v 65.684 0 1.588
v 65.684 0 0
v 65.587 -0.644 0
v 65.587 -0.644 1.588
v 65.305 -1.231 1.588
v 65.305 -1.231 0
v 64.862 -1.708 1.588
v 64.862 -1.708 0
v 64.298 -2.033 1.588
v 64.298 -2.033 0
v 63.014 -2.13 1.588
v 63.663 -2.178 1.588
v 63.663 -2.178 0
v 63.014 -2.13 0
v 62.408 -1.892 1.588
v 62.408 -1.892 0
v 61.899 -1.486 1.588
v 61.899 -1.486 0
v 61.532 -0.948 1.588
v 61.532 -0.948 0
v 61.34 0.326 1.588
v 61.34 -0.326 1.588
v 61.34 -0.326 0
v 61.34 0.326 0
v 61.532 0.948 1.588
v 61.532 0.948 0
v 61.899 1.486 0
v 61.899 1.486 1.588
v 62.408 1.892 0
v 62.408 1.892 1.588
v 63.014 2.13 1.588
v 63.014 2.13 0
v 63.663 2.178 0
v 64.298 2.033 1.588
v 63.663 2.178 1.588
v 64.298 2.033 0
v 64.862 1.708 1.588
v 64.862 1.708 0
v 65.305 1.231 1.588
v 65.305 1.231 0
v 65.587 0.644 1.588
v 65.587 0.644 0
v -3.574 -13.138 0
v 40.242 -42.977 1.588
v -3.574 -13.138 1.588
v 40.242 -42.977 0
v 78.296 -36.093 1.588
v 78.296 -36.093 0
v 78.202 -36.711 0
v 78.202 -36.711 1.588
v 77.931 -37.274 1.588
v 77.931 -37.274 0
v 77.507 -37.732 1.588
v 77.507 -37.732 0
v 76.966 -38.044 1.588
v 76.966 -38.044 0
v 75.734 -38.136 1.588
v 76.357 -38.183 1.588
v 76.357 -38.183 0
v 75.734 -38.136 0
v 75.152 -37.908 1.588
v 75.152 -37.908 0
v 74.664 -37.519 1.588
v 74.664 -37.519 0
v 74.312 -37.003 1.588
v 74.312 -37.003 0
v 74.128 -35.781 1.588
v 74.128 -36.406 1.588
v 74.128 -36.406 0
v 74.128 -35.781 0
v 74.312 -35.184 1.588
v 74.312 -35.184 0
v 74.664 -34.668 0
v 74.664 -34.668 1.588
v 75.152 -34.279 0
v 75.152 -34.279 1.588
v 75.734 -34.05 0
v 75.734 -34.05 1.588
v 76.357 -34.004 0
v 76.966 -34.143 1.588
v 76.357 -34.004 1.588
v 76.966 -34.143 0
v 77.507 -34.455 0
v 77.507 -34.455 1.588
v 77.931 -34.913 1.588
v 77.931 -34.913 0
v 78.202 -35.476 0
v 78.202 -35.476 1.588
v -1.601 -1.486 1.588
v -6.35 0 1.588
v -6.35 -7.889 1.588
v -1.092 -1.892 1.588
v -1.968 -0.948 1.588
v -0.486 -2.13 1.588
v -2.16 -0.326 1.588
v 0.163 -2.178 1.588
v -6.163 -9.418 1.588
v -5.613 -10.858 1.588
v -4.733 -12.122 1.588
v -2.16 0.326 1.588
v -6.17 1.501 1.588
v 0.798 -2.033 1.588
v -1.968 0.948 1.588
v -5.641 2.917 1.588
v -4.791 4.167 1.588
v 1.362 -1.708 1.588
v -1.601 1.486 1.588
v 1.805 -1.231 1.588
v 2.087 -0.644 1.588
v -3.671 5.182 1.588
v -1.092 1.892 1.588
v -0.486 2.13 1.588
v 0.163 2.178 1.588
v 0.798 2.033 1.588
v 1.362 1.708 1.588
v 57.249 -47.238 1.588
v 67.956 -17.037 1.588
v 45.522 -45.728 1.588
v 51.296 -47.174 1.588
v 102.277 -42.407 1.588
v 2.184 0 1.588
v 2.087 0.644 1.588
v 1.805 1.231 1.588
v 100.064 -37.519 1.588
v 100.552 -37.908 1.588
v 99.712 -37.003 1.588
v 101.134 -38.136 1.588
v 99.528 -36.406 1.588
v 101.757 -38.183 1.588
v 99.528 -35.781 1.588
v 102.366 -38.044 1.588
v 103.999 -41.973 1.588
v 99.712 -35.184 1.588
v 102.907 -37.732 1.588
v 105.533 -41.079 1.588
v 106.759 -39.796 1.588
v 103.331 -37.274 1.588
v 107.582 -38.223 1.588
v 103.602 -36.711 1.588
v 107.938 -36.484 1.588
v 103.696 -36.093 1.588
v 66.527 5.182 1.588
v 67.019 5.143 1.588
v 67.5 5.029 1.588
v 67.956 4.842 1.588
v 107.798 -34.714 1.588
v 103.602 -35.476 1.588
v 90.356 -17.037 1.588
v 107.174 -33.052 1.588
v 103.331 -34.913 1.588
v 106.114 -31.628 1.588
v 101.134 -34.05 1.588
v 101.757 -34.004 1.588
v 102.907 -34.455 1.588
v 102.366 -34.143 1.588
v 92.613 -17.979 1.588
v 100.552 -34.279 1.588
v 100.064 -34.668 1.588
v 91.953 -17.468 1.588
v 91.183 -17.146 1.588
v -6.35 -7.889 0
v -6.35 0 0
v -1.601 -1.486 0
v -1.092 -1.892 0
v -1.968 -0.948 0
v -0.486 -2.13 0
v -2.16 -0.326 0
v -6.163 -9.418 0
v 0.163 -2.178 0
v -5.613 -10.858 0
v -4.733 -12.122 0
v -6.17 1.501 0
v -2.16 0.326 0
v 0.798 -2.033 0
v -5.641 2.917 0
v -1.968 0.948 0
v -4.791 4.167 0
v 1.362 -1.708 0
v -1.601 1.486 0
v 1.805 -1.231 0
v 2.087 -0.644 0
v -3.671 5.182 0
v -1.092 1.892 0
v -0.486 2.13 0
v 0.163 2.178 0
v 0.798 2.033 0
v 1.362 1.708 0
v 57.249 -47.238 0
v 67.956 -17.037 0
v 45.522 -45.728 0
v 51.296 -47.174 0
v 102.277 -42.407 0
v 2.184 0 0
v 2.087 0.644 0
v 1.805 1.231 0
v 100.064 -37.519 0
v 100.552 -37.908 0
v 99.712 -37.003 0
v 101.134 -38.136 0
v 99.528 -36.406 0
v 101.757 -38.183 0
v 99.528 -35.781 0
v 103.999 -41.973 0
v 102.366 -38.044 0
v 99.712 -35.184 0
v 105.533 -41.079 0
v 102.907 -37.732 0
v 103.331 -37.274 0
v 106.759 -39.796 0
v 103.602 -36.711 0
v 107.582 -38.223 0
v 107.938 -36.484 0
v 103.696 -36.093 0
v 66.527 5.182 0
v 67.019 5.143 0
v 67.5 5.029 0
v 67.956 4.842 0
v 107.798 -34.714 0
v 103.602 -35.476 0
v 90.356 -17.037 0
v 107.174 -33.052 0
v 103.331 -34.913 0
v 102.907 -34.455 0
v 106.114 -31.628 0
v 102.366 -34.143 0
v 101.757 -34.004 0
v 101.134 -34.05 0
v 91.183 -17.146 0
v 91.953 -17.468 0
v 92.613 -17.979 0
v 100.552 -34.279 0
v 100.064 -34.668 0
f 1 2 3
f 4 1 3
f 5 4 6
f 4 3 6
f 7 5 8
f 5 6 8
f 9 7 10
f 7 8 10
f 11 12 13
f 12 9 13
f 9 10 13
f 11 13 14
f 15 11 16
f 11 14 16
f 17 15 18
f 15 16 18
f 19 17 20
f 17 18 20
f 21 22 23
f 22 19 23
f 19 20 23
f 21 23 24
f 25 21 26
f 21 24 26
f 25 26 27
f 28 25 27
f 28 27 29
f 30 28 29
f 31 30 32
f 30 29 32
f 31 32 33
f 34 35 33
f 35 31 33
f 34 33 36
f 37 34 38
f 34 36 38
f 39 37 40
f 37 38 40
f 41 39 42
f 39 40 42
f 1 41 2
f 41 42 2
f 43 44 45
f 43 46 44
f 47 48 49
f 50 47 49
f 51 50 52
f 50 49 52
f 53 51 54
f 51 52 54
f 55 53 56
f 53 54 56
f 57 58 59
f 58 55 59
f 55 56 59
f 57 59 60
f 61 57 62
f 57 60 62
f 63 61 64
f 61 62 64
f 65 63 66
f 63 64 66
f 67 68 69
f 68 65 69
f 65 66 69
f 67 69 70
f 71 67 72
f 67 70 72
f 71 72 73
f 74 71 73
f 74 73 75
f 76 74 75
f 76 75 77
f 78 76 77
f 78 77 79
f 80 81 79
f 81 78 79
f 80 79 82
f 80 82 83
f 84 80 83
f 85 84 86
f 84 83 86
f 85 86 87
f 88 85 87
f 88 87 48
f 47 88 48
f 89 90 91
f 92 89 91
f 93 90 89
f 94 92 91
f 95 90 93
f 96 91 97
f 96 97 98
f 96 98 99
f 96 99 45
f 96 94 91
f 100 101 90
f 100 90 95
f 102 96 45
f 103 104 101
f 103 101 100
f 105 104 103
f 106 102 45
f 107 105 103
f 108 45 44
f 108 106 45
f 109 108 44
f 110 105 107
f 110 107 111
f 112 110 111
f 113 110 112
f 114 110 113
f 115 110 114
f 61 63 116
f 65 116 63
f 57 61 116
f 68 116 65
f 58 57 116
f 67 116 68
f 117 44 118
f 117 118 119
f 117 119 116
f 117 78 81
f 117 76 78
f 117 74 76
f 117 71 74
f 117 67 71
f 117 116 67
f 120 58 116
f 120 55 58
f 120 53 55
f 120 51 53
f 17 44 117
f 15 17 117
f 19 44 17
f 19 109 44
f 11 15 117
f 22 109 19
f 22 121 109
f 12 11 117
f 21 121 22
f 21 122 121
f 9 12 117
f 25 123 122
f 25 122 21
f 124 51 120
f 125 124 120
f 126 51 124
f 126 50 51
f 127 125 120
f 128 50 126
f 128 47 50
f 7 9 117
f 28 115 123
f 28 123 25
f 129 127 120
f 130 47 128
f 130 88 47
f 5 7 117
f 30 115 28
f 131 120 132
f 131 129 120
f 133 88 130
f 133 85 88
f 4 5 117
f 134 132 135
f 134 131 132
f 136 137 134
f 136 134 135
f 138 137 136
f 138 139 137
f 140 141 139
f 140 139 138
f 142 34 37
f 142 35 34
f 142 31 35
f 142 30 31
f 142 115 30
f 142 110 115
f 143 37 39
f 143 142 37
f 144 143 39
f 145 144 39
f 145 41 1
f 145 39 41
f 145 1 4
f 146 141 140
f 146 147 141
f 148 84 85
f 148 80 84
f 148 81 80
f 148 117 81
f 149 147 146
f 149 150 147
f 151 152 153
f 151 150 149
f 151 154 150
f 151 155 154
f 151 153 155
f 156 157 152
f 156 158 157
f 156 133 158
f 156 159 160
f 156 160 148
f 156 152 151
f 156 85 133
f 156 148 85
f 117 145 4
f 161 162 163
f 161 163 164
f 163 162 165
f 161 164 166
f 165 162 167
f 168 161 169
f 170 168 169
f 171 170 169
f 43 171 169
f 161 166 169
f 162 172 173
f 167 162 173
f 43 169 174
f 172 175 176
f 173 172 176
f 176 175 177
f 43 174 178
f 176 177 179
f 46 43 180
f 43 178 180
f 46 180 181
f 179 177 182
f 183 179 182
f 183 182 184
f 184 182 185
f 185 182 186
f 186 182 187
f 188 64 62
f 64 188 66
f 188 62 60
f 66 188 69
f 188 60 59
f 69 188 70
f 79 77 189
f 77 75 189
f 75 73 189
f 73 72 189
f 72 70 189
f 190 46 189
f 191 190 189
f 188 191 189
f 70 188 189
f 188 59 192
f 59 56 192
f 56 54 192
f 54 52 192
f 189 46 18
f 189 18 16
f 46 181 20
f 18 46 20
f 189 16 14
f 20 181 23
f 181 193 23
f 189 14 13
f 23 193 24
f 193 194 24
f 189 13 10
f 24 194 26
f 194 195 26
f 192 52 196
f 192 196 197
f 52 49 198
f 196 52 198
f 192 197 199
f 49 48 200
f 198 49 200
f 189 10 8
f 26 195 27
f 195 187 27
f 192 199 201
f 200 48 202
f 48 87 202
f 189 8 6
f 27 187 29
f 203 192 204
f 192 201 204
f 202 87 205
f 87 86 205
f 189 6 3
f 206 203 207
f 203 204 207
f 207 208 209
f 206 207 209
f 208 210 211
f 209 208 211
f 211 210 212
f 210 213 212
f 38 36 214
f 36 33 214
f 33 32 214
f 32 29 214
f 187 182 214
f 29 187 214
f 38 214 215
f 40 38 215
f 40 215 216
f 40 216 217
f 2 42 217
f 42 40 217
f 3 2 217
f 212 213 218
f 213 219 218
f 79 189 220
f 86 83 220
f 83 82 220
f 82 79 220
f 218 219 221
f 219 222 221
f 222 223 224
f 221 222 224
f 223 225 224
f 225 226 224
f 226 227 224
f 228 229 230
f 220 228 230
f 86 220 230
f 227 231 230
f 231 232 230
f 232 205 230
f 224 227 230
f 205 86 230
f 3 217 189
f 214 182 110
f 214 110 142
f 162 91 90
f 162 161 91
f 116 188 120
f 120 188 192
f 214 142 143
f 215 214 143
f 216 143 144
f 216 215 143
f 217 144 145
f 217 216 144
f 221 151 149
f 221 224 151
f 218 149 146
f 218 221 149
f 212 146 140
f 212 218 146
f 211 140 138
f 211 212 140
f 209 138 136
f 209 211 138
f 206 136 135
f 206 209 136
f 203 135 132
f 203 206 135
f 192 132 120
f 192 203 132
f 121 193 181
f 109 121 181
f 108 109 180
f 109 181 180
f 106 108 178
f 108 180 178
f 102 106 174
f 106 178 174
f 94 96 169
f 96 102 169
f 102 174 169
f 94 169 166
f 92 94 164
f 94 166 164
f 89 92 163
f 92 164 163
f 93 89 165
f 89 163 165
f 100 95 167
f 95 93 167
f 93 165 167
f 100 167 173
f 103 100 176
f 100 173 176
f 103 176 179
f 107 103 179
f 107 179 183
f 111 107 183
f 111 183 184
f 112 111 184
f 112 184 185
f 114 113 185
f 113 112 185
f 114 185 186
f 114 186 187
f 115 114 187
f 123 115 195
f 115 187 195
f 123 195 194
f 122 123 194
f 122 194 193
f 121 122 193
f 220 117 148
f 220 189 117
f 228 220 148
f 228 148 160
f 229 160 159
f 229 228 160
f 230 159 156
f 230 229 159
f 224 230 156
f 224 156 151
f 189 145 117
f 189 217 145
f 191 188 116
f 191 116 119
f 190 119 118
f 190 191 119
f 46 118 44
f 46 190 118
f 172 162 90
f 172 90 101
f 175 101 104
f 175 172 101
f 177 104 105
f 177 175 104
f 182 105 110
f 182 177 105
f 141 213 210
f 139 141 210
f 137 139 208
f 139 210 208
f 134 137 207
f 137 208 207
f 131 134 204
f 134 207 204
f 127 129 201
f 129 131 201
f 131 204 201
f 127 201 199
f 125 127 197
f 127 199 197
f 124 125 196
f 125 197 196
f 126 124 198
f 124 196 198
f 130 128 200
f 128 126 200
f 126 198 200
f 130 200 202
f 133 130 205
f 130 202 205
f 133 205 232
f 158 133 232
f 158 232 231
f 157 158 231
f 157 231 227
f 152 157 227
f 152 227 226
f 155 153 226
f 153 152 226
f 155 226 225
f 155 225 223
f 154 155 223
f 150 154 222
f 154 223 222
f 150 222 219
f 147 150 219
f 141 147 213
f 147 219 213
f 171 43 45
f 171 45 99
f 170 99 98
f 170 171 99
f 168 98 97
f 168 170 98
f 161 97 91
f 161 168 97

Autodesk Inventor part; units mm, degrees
ref_plane "YZ Plane" through (0, 0, 0) normal (1, 0, 0) x (0, 1, 0)
ref_plane "XZ Plane" through (0, 0, 0) normal (0, 1, 0) x (-1, 0, 0)
ref_plane "XY Plane" through (0, 0, 0) normal (0, 0, 1) x (1, 0, 0)
sketch "main" plane through (0, 0, 0) normal (0, 0, 1) x (1, 0, 0)
  arc A0 (7.9061, 59.9189) -> (2.6576, 57.1432) centre (7.9061, 53.5689) ccw
  line L0 (7.9061, 59.9189) -> (15.7951, 59.9189)
  arc A1 (20.9767, 57.2396) -> (15.7951, 59.9189) centre (15.7951, 53.5689) ccw
  circle A2 centre (15.7951, 53.5689) radius 2.1844
  arc A3 (-27.1814, 13.3264) -> (-31.4423, -3.6797) centre (-6.1872, -0.9705) ccw
  circle A4 centre (15.7951, -9.9311) radius 2.1844
  line L1 (20.9767, 57.2396) -> (20.9767, -12.9584)
  circle A5 centre (-20.2983, -22.6311) radius 2.0955
  line L2 (-2.1836, -39.0438) -> (-15.8326, -52.5455)
  circle A6 centre (-20.2983, -48.0311) radius 2.0955
  line L3 (-31.4423, -3.6797) -> (-26.6121, -48.7084)
  arc A7 (-26.6121, -48.7084) -> (-15.8326, -52.5455) centre (-20.2983, -48.0311) ccw
  line L4 (-27.1814, 13.3264) -> (2.6576, 57.1432)
  line L5 (-1.2414, -14.3873) -> (-1.2414, -36.7866)
  arc A8 (20.637, -14.3873) -> (20.9767, -12.9584) centre (17.8017, -12.9584) ccw
  arc A9 (-2.1836, -39.0438) -> (-1.2414, -36.7866) centre (-4.4164, -36.7866) ccw
  line L6 (20.637, -14.3873) -> (-1.2414, -14.3873)
  point P0 (-2.1335, 12.2772)
  point P1 (20.9767, -16.1334)
  dimension "d0" = 12.7
  dimension "d1" = 6.35
  dimension "d2" = 25.4
  dimension "d3" = 4.191
  dimension "d4" = 4.191
  dimension "d5" = 4.3688
  dimension "d8" = 3.175
sketch "Sketch1" plane through (0, 0, 0) normal (0, 0, 1) x (1, 0, 0)
  arc A0 (-6.35, -7.889) -> (-3.5742, -13.1375) centre (0, -7.889) ccw
  line L0 (-6.35, -7.889) -> (-6.35, 0)
  arc A1 (-3.6706, 5.1816) -> (-6.35, 0) centre (0, 0) ccw
  circle A2 centre (0, 0) radius 2.1844
  arc A3 (40.2425, -42.9766) -> (57.2486, -47.2375) centre (54.5395, -21.9824) ccw
  circle A4 centre (63.5, 0) radius 2.1844
  line L1 (-3.6706, 5.1816) -> (66.5273, 5.1816)
  circle A5 centre (76.2, -36.0934) radius 2.0955
  line L2 (92.6127, -17.9787) -> (106.1144, -31.6277)
  circle A6 centre (101.6, -36.0934) radius 2.0955
  line L3 (57.2486, -47.2375) -> (102.2773, -42.4072)
  arc A7 (102.2773, -42.4072) -> (106.1144, -31.6277) centre (101.6, -36.0934) ccw
  line L4 (40.2425, -42.9766) -> (-3.5742, -13.1375)
  line L5 (67.9562, -17.0366) -> (90.3555, -17.0366)
  arc A8 (67.9562, 4.8419) -> (66.5273, 5.1816) centre (66.5273, 2.0066) ccw
  arc A9 (92.6127, -17.9787) -> (90.3555, -17.0366) centre (90.3555, -20.2116) ccw
  line L6 (67.9562, 4.8419) -> (67.9562, -17.0366)
  point P0 (0, 0)
extrude "Extrusion1" add sketch "Sketch1" along normal blind 1.5875
equation "\"BendRadius\" = Thickness"
equation "\"BendReliefWidth\" = Thickness"
equation "\"BendReliefDepth\" = 0.5 * Thickness"
equation "\"CornerReliefSize\" = 4 * Thickness"
equation "\"MinimumRemnant\" = 2 * Thickness"
equation "\"TransitionRadius\" = BendRadius"
equation "\"JacobiRadiusSize\" = BendRadius"
equation "\"GapSize\" = Thickness"
equation "\"Thickness\" = 1.5875"
properties part number "sled" material "Acetal Resin, White"
